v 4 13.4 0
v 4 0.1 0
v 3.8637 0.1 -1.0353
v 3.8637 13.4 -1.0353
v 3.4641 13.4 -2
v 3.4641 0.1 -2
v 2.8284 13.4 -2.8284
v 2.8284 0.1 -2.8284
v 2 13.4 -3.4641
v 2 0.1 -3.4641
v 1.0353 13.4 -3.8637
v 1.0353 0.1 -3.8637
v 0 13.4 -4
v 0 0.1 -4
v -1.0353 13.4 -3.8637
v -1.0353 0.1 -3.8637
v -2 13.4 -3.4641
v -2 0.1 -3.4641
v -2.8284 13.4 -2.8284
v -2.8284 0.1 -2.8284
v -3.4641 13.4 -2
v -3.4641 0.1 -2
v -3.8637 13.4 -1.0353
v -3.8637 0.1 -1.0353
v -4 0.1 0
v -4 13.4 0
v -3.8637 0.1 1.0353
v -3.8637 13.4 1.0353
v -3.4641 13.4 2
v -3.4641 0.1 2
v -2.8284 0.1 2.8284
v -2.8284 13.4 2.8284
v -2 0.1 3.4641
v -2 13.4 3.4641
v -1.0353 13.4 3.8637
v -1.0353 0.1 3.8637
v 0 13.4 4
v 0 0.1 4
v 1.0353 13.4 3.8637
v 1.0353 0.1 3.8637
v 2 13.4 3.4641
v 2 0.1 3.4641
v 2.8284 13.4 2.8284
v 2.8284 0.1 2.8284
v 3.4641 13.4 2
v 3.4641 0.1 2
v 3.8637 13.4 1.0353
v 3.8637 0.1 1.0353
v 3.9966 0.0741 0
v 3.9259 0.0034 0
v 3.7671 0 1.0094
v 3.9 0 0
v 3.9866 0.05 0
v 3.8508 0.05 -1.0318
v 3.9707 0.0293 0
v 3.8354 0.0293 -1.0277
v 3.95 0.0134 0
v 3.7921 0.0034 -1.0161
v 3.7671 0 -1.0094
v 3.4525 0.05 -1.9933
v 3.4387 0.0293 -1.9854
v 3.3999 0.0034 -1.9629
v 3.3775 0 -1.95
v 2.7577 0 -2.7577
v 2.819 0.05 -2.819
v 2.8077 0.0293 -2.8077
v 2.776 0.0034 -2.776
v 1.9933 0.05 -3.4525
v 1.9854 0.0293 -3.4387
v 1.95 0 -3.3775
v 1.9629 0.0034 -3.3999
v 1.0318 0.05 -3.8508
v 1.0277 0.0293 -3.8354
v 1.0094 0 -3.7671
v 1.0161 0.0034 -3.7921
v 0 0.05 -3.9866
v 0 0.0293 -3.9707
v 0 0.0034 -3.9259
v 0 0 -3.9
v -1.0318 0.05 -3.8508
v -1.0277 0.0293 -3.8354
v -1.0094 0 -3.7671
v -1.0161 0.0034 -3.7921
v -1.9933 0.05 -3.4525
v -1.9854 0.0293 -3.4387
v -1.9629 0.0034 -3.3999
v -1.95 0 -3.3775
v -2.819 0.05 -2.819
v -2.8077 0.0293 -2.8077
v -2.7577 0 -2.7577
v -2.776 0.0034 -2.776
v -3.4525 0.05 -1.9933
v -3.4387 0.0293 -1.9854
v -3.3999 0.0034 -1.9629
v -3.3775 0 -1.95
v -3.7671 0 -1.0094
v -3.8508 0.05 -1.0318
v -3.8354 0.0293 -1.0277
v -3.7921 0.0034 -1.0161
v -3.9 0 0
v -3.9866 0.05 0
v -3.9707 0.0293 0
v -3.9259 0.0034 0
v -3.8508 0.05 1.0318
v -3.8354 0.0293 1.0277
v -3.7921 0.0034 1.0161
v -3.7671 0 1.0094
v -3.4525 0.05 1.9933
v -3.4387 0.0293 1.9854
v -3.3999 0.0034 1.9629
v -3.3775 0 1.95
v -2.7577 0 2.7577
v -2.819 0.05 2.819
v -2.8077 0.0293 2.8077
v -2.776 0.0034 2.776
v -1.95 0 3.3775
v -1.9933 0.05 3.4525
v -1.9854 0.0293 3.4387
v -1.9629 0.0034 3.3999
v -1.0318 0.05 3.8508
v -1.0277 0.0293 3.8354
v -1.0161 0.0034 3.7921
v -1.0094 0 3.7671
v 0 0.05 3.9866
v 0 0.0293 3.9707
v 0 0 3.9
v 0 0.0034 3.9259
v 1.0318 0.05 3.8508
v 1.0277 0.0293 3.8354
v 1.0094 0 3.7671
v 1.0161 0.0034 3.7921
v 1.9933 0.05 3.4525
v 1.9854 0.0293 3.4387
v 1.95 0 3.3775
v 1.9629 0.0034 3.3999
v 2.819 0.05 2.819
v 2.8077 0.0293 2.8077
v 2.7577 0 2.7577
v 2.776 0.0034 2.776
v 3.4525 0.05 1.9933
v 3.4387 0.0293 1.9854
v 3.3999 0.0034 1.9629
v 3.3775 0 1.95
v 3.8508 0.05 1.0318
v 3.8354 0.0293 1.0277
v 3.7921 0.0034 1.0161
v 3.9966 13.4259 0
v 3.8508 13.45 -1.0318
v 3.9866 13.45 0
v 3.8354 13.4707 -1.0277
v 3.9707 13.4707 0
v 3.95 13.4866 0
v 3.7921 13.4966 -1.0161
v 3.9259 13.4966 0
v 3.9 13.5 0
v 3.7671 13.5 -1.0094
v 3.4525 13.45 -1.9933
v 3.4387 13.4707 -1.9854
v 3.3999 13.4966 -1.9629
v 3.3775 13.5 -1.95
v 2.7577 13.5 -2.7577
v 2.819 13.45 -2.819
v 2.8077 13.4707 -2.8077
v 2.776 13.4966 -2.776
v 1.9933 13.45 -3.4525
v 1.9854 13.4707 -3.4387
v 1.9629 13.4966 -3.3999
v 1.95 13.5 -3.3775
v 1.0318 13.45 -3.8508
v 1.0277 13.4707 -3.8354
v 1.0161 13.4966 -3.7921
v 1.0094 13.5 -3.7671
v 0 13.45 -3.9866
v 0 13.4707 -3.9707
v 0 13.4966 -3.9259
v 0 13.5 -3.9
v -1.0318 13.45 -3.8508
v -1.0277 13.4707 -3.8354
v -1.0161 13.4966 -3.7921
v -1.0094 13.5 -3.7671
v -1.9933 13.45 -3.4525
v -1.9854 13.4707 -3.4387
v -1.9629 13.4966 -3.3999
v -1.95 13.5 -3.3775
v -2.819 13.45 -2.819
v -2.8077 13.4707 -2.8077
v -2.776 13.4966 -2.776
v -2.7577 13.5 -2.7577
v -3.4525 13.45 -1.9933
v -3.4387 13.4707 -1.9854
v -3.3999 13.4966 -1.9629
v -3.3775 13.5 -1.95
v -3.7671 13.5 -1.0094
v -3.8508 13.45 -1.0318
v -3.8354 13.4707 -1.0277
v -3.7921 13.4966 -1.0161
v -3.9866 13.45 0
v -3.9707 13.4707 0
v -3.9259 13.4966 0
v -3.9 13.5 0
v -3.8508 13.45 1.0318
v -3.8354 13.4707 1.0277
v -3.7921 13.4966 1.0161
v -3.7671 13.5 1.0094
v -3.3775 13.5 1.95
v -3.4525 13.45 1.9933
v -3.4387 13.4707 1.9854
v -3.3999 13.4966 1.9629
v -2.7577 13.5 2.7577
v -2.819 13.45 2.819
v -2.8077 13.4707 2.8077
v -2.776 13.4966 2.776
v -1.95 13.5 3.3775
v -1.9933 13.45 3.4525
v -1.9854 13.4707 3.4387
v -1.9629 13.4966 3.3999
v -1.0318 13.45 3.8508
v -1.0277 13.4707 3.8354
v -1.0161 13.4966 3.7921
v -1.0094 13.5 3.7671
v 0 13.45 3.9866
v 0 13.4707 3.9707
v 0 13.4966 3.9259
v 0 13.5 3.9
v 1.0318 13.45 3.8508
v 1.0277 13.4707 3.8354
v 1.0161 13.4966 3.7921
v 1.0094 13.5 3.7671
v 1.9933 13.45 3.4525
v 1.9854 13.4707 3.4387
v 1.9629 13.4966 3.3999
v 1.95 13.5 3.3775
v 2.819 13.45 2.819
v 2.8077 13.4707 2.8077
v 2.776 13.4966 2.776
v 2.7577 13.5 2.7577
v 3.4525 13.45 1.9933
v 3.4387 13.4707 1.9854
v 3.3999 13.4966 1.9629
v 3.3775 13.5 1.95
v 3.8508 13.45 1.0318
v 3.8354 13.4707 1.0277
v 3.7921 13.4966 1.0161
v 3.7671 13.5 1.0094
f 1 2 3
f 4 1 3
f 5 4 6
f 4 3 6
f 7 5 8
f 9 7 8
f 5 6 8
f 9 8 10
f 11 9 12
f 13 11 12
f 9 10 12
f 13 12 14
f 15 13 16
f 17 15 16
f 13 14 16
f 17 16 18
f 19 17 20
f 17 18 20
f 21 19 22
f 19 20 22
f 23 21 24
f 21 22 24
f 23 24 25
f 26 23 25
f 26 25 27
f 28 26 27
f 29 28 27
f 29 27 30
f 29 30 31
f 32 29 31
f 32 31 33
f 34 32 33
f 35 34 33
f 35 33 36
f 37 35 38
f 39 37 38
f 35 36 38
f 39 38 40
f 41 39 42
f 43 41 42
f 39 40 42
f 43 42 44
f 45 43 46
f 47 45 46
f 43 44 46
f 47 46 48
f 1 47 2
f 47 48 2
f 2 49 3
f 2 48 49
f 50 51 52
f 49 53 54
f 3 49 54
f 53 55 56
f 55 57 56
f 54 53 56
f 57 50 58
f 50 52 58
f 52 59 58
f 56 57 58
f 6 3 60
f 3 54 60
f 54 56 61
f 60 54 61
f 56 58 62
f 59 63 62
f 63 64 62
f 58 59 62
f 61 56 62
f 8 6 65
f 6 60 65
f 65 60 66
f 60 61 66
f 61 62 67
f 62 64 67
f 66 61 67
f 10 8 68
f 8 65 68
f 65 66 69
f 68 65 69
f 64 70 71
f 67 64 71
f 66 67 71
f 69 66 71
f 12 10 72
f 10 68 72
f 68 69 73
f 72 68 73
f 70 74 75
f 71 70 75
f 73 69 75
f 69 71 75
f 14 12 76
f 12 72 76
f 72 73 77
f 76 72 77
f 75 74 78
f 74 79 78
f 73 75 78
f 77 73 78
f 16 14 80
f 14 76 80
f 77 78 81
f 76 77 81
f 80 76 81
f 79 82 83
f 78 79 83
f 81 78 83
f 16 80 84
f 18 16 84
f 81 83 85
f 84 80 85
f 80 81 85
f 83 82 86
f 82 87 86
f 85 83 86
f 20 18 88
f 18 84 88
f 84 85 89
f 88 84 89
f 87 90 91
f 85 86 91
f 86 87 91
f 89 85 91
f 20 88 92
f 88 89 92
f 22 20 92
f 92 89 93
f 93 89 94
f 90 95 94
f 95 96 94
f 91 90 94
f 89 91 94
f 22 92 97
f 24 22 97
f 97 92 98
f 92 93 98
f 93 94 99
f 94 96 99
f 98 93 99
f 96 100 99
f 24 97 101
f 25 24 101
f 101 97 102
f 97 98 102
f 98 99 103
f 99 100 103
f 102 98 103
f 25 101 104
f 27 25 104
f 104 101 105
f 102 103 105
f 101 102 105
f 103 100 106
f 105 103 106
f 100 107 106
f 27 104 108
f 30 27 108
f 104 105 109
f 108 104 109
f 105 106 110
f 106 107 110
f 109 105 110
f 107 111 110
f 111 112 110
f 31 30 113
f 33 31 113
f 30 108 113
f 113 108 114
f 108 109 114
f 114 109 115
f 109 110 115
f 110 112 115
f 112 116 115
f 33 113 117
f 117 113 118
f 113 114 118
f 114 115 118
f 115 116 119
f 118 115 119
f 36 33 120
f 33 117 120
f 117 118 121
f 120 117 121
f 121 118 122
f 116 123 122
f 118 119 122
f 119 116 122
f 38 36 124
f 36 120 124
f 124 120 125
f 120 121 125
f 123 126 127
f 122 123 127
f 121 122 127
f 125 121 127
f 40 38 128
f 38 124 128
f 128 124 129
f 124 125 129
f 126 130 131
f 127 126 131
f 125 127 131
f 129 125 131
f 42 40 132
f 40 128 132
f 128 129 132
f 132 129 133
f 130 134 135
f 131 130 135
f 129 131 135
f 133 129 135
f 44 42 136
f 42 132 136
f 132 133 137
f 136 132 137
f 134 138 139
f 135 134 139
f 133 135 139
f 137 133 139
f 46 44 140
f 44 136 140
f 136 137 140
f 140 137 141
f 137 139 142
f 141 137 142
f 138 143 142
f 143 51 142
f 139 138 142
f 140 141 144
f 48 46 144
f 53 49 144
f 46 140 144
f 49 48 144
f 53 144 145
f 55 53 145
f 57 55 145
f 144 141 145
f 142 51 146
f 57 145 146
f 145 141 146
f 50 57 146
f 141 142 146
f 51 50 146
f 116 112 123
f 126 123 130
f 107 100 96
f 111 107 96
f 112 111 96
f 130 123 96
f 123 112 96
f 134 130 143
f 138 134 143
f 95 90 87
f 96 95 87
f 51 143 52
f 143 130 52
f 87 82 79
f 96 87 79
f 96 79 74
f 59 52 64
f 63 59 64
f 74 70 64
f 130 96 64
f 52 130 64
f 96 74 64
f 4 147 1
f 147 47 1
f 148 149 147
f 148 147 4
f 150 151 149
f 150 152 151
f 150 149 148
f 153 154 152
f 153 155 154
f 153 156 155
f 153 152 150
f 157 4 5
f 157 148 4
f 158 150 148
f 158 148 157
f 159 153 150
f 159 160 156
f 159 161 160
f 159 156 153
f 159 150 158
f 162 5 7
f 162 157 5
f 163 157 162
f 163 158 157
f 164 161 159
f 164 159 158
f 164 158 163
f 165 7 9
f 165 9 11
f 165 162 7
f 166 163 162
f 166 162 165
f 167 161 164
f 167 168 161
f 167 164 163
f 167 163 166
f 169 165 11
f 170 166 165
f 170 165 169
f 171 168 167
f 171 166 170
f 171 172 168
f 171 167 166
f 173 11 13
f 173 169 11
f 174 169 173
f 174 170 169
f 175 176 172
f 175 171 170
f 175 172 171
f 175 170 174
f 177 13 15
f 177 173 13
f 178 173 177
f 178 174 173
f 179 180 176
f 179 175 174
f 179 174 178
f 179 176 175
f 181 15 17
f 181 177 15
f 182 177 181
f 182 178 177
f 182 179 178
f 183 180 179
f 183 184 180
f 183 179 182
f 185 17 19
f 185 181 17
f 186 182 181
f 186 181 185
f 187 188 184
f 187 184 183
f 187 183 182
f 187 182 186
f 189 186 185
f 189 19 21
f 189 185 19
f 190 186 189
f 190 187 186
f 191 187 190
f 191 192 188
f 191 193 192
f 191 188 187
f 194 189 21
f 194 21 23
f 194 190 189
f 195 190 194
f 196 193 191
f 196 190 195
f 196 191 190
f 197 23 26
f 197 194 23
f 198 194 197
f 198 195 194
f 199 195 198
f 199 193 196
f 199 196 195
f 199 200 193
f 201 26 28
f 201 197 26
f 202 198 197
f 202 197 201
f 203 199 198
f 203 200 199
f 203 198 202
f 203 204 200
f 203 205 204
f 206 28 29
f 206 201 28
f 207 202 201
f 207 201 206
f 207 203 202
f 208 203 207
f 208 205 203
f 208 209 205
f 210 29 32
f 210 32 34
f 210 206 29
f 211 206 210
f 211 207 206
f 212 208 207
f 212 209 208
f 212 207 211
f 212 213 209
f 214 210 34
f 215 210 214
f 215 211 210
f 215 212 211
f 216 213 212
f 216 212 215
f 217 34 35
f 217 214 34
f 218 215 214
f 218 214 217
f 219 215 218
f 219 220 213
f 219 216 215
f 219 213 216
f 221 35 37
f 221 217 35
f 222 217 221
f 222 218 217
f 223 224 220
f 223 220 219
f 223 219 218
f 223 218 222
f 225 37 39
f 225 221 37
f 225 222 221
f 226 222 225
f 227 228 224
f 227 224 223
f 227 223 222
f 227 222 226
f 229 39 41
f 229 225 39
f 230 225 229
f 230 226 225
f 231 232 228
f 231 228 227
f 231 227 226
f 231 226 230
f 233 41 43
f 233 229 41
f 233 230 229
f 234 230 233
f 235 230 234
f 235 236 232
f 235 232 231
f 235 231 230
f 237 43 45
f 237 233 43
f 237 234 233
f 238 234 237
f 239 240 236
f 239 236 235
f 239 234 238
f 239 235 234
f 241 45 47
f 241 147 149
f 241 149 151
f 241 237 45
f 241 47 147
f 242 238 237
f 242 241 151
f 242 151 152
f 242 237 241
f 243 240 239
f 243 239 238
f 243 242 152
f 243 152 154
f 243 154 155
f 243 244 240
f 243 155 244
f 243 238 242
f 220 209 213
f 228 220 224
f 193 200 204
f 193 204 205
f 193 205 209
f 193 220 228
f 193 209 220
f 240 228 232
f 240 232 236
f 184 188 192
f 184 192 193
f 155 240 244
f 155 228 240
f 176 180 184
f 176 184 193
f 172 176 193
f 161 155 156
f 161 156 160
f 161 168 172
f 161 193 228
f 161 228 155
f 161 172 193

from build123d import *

# Parameters (mm, degrees)
SKETCH_1_R      = 4
EXTRUDE_1_DEPTH = 13.5
FILLET_1_R      = 0.1
FILLET_2_R      = 0.1


with BuildPart() as part:
    # Эскиз1 → Бобышка-Вытянуть1 (new body)
    with BuildSketch(Plane(origin=(0, 0, 0), x_dir=(1, 0, 0), z_dir=(0, 1, 0))):
        Circle(SKETCH_1_R)
    extrude(amount=EXTRUDE_1_DEPTH)

    # Скругление1
    fillet_1_edges = [part.edges().sort_by_distance(p)[0] for p in [
        (-4, 13.5, 0),
    ]]
    fillet(fillet_1_edges, radius=FILLET_1_R)

    # Скругление2
    fillet_2_edges = [part.edges().sort_by_distance(p)[0] for p in [
        (-4, 0, 0),
    ]]
    fillet(fillet_2_edges, radius=FILLET_2_R)


solid = part.part
